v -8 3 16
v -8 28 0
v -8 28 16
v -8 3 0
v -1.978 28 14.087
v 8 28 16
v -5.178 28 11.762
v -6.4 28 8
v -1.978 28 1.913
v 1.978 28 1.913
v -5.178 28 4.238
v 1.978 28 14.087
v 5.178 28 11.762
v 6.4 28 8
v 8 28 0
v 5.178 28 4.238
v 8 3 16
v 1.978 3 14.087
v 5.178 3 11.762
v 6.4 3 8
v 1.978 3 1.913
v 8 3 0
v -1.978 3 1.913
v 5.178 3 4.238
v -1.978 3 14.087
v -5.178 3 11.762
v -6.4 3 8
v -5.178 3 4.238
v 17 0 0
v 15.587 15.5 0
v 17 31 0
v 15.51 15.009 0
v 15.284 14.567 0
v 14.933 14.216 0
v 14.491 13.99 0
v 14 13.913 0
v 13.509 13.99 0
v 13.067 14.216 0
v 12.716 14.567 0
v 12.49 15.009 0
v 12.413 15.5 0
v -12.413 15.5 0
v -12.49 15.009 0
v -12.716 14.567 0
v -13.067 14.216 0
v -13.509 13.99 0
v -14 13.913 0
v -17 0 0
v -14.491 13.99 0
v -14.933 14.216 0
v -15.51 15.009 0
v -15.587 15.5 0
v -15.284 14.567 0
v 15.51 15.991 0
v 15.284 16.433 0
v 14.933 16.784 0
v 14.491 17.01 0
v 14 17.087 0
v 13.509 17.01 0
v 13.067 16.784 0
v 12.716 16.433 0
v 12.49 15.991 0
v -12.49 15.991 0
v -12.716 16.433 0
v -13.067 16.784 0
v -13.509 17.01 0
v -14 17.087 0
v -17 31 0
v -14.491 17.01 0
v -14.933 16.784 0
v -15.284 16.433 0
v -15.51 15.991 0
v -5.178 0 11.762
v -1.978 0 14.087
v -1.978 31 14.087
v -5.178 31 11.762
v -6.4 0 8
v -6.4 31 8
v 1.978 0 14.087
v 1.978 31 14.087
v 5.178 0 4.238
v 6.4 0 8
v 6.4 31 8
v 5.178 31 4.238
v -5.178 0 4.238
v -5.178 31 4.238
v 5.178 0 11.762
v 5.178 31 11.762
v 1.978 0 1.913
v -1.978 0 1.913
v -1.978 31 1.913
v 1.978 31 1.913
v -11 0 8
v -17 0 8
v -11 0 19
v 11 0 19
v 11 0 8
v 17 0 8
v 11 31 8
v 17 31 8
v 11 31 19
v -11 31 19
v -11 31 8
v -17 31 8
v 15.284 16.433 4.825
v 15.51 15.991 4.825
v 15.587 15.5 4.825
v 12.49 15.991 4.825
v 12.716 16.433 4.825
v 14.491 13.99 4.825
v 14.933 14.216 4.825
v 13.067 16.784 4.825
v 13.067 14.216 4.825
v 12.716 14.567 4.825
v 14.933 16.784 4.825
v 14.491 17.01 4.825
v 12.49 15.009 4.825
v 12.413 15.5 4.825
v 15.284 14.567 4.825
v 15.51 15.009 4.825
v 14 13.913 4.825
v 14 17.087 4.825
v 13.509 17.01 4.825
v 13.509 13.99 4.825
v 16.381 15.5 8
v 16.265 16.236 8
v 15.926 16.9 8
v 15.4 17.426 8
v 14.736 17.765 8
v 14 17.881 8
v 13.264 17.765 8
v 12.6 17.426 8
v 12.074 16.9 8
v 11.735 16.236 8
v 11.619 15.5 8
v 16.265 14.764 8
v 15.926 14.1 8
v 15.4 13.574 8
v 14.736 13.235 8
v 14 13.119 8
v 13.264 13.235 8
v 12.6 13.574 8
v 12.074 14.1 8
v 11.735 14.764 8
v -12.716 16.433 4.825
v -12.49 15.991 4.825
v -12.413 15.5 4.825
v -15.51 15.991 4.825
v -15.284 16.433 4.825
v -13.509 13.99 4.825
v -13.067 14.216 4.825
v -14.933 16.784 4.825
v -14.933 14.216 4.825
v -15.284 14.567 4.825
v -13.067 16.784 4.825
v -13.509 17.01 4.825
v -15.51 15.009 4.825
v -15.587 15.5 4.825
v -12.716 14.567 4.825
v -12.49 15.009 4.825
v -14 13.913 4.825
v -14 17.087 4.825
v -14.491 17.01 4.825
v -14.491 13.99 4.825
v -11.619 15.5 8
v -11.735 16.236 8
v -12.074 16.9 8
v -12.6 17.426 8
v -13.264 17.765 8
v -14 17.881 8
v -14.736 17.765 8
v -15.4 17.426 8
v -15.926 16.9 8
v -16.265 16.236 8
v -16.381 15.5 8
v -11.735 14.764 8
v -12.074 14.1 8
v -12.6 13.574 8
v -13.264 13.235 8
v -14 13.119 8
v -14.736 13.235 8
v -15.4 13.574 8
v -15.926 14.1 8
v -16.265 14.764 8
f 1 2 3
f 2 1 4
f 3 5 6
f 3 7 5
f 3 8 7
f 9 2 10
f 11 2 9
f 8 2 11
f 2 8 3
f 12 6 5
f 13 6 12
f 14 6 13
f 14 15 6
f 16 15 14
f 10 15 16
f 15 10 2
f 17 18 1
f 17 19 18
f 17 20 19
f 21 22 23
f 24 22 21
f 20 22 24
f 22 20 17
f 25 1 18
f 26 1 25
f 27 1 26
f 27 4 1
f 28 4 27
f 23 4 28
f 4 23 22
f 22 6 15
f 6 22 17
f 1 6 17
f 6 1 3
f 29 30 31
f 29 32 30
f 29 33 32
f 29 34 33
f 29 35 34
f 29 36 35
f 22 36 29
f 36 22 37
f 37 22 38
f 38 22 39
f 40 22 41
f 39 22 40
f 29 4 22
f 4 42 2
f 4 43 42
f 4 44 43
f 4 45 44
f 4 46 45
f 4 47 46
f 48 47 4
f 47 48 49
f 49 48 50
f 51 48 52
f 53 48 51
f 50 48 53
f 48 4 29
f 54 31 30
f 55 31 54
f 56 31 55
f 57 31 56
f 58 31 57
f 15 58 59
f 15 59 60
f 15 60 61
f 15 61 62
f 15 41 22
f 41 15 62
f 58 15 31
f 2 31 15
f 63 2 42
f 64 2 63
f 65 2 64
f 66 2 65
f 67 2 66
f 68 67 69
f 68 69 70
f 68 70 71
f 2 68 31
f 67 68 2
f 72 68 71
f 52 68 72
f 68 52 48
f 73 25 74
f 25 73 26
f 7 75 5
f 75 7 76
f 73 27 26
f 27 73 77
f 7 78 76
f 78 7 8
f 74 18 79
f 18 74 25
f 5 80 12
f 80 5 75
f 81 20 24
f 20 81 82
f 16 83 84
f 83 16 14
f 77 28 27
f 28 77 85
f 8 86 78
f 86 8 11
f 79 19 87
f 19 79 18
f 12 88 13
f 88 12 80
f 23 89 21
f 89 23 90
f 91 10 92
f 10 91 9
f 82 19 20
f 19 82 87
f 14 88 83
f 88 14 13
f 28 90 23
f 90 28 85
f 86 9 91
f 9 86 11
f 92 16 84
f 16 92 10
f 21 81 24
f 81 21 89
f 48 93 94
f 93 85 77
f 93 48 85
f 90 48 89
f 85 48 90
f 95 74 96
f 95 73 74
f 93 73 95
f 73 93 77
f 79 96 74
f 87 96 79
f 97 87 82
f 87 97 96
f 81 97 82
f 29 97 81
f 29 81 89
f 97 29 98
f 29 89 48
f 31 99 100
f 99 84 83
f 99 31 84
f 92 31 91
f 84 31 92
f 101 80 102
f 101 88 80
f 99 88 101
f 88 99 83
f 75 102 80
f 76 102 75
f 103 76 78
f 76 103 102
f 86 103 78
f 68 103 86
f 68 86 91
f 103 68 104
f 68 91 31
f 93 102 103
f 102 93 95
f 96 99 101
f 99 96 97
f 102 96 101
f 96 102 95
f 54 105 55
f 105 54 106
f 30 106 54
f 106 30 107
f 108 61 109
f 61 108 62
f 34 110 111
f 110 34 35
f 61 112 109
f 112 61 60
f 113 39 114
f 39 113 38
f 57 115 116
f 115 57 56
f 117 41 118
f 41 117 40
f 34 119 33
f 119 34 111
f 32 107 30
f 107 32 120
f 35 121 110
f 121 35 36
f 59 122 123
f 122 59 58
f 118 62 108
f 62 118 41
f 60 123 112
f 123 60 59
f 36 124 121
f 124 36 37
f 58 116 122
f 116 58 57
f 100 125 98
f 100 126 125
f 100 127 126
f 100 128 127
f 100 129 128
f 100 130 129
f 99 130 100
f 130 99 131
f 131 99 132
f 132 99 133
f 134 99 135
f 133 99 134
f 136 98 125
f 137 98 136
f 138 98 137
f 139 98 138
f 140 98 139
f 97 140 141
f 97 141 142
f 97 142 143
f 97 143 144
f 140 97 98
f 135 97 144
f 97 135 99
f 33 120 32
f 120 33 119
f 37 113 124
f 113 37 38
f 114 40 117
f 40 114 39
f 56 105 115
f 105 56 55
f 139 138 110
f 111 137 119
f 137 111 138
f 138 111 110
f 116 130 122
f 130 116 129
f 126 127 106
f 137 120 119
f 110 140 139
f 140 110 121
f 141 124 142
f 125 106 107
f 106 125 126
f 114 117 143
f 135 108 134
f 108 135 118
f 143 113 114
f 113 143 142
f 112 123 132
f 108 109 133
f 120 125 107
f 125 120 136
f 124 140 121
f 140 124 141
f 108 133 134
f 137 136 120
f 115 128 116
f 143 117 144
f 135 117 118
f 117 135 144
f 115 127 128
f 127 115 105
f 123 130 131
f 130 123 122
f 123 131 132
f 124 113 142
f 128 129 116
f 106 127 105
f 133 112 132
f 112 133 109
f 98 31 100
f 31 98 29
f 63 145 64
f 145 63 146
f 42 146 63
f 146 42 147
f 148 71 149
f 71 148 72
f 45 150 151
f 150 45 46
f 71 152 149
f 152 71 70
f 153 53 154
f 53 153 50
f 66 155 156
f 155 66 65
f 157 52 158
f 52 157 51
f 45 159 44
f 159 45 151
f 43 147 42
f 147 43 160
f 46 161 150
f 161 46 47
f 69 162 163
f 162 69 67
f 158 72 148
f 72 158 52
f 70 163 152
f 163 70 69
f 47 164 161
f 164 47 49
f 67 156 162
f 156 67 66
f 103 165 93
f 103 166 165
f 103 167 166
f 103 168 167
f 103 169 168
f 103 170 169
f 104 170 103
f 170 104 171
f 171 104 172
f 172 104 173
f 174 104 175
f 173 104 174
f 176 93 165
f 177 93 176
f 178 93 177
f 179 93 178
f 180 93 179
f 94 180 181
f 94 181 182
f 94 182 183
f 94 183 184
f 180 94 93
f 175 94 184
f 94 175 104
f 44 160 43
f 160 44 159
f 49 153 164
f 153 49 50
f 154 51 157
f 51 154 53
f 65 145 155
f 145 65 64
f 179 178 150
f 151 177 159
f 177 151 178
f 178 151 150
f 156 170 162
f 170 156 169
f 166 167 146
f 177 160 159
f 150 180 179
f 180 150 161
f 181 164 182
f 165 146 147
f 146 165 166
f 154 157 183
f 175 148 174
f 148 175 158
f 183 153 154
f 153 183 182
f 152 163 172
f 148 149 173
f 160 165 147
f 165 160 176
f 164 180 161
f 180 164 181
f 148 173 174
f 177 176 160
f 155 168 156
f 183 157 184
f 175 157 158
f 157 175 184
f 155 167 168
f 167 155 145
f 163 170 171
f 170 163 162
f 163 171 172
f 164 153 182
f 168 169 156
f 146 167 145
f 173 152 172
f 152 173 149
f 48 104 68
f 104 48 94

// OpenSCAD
// file: bearing-holder.scad
module bearing_holder(n=1){

  length = 25;
  bearing_size = 16*IJ+length*K;
  wall_thick = 3;


  size      = bearing_size+wall_thick*(2*I+J+2*K);

  screw_hole_diameter = 2*in/16;
  screw_hole_length   = 8;
  screw_head_diameter = 3*in/16;;
  screw_head_length   = 2*in/16;;
  screw_resolution    = 20;
  screw_type          = "conic";
  screw_quantity      = 2;

  base_x = 6;

  base_size = 
    base_x*I+
    (length+2*wall_thick)*J+
    screw_hole_length*K;

  
  holder();

  module holder(){
    rx(-90)
    rz(180)
    difference(){
      cblock(size);
      ty(bearing_size*J/2)
      bearing();
    }
    module bearing(){
      tz(wall_thick)
      cblock(bearing_size,cy=true);
      cylinder(r=(80/100)*bearing_size*I/2,h=size*K);
    }
    d = (size+base_size)*I/2;
    tx(+d)
    base();
    tx(-d)
    base();
  }
  module base(){
    difference(){
      cblock(base_size);
      screw(screw_type,n=screw_quantity,$fn=screw_resolution);
    }
    module screw(type="hole"){
      ty(base_size*J/2)
      union(){
        if(type == "conic"){
          union(){
            cylinder(
              r=screw_hole_diameter/2,
              h=screw_hole_length);
              tz(screw_hole_length-screw_head_length)
            cylinder(
            r1=screw_hole_diameter/2,
            r2=screw_head_diameter/2,
            h=screw_head_length);
          }
        }
        else if(type == "squared"){
          union(){
            cylinder(
              r=screw_hole_diameter/2,
              h=screw_hole_length);
              tz(screw_hole_length-screw_head_length)
            cylinder(
            r=screw_head_diameter/2,
            h=screw_head_length);
          }
        }
        else {
          cylinder(
            r=screw_hole_diameter/2,
            h=screw_hole_length);
        }
      }
    }
  }

}
// file: bed-cart.scad
module bedcart(){
  paper_x = 216;
  screw_dist = 209;

  shaft_dist = 170;

  box_size = 216*(I+J)+K;

  bearing_size = 16*I+25*J+K;

  bearing_dist = 70;
  
  translate((paper_x-box_size*I)*I/2+10*J+box_size/2-K)
  difference(){
    cube(box_size,center=true);
    union(){
      cutoffs();
      bearing();
      holes();
    }
  }

  module cutoffs(){

    i = [1,0];
    j = [0,1];


    mirror(J)
    shape1();
    shape1();

    mirror(I)
    shape2();
    shape2();

    module shape1(){

      x = shaft_dist/2;
      y = box_size*J/2;
  
      p = [

        -x*i/2-y*j,
        -(50/100)*y*j,
        +x*i/2-y*j,

      ];

      tz(-0.5)
      linear_extrude(1)
      polygon(p);
    }

    module shape2(){

      sd = shaft_dist/2;
      bs = box_size*J/2;
  
      p = [

        -bs*i+1*in*j/2,
        -sd*i,
        -bs*i-1*in*j/2,

      ];

      tz(-0.5)
      linear_extrude(1)
      polygon(p);
    }

  }

  module bearing(){

    a = shaft_dist*I/2+bearing_dist*J/2;

    set();
    mirror(J)
    set();

    module set(){
      translate(+a)
      cube(bearing_size,center=true);

      translate(-a)
      cube(bearing_size,center=true);
    }

  }

  module holes(){
    a = (+I+J)*screw_dist/2;
    b = (-I+J)*screw_dist/2;
    c = (+I-J)*screw_dist/2;
    d = (-I-J)*screw_dist/2;
    translate(a)
    cylinder(r=screw_r,h=1,center=true);
  
    translate(b)
    cylinder(r=screw_r,h=1,center=true);

    translate(c)
    cylinder(r=screw_r,h=1,center=true);
  
    translate(d)
    cylinder(r=screw_r,h=1,center=true);

    e = 1*in/2;
    ty(+e)
    cylinder(r=screw_r,h=1,center=true);
    
    ty(-e)
    cylinder(r=screw_r,h=1,center=true);

    cylinder(r=screw_r,h=1,center=true);


    mirror(I)
    bearing_holes();

    mirror(J)
    bearing_holes();

    mirror(I)
    mirror(J)
    bearing_holes();

    bearing_holes();
    module bearing_holes(){
      gap = (box_size*I-shaft_dist-bearing_size*I)/2;

      translate((-gap/2+box_size*I/2)*I+bearing_dist*J/2)
      cylinder(r=screw_r,h=1,center=true);

      translate((-3*gap/2-bearing_size*I+box_size*I/2)*I+bearing_dist*J/2)
      cylinder(r=screw_r,h=1,center=true);
    }
  }

}
// file: x-cart.scad
module xcart(){
  screw_dist = 48;
  
  bear_size = [50,16,1];
  bear_dist = 47;
  
  box_size = [70,83,1];
  gap = 30*(I+J);

  difference(){
    cube(box_size,center=true);
    holes();
  }

  module holes(){
  
    translate(+J*bear_dist/2)
    cube(bear_size,center=true);
  
    translate(-J*bear_dist/2)
    cube(bear_size,center=true);

    a = +I*screw_dist/2;
    b = -I*screw_dist/2;
    c = +I*30+36.5*J;
    d = -I*30+36.5*J;
    e = +I*30-36.5*J;
    f = -I*30-36.5*J;

    echo(a);
    echo(b);
    echo(c);
    echo(d);
    echo(e);
    echo(f);
  
    translate(a)
    cylinder(r=screw_r,h=1,center=true);
  
    translate(b)
    cylinder(r=screw_r,h=1,center=true);

    translate(c)
    cylinder(r=screw_r,h=1,center=true);
  
    translate(d)
    cylinder(r=screw_r,h=1,center=true);
  
    translate(e)
    cylinder(r=screw_r,h=1,center=true);
  
    translate(f)
    cylinder(r=screw_r,h=1,center=true);

    cylinder(r=screw_r,h=1,center=true);

    mirror(I)
    bearing_holes();

    mirror(J)
    bearing_holes();

    mirror(I)
    mirror(J)
    bearing_holes();

    bearing_holes();
    module bearing_holes(){
      tx(bear_size*I/4)
      ty(box_size*J/2-5)
      cylinder(r=screw_r,h=1,center=true);

      tx(bear_size*I/4)
      ty(box_size*J/2-15-bear_size*J)
      cylinder(r=screw_r,h=1,center=true);
    }
  
  }
}
// file: utils.scad
in  = 25.4; // [mm/inch]

// i, j, k vector from Linear Algebra
I = [1,0,0];
J = [0,1,0];
K = [0,0,1];

O = [0,0,0];

IJ = I+J;// xy-plane
JI = I+J;// xy-plane
IK = I+K;// xz-plane
KI = I+K;// xz-plane
JK = J+K;// yz-plane
KJ = J+K;// yz-plane
IJK = I+J+K;

function Rapothem(r,n) = r*cos(180/n);
function Aapothem(a,n) = a/cos(180/n);

function Ones(length) =
    let (length = abs(length))
    (length > 0) ? [for(i=[0:length-1]) 1]:[];

function Zeros(length) =
    let (length = abs(length))
    (length > 0) ? [for(i=[0:length-1]) 0]:[];

function OnesUntil(n,length) =
    cat(Ones(n),Zeros(length-n));

function SumVector(v) = 
    v*Ones(len(v));

function SumVectorUntil(v,n) = 
    v*OnesUntil(n,len(v));

function cat(v1,v2) = [
    for(i=[0:len(v1)+len(v2)-1])
        (i < len(v1)) ?
        v1[i]         :
        v2[i-len(v1)]
];

function odd(n)  = (n%2);
function even(n) = !odd(n);

module sector(r=15,angle=30,height=1,n=5) {
    P = [
            for(i = [-1:n])
                let (t =i*angle/n)
                (i == -1)?
                [0,0]:
                r*[cos(t),sin(t)]

        ];
    linear_extrude(height) polygon(P);
}
module ring(R=20,r=15,angle=30,height=1,n=5) {
    difference() {
        sector(max(R,r),angle,height,n);
        sector(min(R,r),angle,height,n);
    }
}

module cblock(size,cx=true,cy=false,cz=false,center=false) {
    if(center)
        cube(size,center=true);
    else
    {
        // If it is a scalar
        if(size[0] == undef)
            cblock(size*IJK,cx,cy,cz,center);
        else
        {
            dx = (cx) ? -0.5*size*I : 0;
            dy = (cy) ? -0.5*size*J : 0;
            dz = (cz) ? -0.5*size*K : 0;
            tx(dx)
            ty(dy)
            tz(dz)
            cube(size);
        }
    }
}
module tx(d=0){
    translate(d*I)
    children();
}
module ty(d=0){
    translate(d*J)
    children();
}
module tz(d=0){
    translate(d*K)
    children();
}
module rx(r=0){
    rotate(r*I)
    children();
}
module ry(r=0){
    rotate(r*J)
    children();
}
module rz(r=0){
    rotate(r*K)
    children();
}
// main file
include <./utils.scad>

include <./x-cart.scad>
include <./bed-cart.scad>
include <./bearing-holder.scad>

$fn=10;

screw_d = 2*in/16;
screw_r = screw_d/2;

*projection(cut=true)
bedcart();

bearing_holder();
